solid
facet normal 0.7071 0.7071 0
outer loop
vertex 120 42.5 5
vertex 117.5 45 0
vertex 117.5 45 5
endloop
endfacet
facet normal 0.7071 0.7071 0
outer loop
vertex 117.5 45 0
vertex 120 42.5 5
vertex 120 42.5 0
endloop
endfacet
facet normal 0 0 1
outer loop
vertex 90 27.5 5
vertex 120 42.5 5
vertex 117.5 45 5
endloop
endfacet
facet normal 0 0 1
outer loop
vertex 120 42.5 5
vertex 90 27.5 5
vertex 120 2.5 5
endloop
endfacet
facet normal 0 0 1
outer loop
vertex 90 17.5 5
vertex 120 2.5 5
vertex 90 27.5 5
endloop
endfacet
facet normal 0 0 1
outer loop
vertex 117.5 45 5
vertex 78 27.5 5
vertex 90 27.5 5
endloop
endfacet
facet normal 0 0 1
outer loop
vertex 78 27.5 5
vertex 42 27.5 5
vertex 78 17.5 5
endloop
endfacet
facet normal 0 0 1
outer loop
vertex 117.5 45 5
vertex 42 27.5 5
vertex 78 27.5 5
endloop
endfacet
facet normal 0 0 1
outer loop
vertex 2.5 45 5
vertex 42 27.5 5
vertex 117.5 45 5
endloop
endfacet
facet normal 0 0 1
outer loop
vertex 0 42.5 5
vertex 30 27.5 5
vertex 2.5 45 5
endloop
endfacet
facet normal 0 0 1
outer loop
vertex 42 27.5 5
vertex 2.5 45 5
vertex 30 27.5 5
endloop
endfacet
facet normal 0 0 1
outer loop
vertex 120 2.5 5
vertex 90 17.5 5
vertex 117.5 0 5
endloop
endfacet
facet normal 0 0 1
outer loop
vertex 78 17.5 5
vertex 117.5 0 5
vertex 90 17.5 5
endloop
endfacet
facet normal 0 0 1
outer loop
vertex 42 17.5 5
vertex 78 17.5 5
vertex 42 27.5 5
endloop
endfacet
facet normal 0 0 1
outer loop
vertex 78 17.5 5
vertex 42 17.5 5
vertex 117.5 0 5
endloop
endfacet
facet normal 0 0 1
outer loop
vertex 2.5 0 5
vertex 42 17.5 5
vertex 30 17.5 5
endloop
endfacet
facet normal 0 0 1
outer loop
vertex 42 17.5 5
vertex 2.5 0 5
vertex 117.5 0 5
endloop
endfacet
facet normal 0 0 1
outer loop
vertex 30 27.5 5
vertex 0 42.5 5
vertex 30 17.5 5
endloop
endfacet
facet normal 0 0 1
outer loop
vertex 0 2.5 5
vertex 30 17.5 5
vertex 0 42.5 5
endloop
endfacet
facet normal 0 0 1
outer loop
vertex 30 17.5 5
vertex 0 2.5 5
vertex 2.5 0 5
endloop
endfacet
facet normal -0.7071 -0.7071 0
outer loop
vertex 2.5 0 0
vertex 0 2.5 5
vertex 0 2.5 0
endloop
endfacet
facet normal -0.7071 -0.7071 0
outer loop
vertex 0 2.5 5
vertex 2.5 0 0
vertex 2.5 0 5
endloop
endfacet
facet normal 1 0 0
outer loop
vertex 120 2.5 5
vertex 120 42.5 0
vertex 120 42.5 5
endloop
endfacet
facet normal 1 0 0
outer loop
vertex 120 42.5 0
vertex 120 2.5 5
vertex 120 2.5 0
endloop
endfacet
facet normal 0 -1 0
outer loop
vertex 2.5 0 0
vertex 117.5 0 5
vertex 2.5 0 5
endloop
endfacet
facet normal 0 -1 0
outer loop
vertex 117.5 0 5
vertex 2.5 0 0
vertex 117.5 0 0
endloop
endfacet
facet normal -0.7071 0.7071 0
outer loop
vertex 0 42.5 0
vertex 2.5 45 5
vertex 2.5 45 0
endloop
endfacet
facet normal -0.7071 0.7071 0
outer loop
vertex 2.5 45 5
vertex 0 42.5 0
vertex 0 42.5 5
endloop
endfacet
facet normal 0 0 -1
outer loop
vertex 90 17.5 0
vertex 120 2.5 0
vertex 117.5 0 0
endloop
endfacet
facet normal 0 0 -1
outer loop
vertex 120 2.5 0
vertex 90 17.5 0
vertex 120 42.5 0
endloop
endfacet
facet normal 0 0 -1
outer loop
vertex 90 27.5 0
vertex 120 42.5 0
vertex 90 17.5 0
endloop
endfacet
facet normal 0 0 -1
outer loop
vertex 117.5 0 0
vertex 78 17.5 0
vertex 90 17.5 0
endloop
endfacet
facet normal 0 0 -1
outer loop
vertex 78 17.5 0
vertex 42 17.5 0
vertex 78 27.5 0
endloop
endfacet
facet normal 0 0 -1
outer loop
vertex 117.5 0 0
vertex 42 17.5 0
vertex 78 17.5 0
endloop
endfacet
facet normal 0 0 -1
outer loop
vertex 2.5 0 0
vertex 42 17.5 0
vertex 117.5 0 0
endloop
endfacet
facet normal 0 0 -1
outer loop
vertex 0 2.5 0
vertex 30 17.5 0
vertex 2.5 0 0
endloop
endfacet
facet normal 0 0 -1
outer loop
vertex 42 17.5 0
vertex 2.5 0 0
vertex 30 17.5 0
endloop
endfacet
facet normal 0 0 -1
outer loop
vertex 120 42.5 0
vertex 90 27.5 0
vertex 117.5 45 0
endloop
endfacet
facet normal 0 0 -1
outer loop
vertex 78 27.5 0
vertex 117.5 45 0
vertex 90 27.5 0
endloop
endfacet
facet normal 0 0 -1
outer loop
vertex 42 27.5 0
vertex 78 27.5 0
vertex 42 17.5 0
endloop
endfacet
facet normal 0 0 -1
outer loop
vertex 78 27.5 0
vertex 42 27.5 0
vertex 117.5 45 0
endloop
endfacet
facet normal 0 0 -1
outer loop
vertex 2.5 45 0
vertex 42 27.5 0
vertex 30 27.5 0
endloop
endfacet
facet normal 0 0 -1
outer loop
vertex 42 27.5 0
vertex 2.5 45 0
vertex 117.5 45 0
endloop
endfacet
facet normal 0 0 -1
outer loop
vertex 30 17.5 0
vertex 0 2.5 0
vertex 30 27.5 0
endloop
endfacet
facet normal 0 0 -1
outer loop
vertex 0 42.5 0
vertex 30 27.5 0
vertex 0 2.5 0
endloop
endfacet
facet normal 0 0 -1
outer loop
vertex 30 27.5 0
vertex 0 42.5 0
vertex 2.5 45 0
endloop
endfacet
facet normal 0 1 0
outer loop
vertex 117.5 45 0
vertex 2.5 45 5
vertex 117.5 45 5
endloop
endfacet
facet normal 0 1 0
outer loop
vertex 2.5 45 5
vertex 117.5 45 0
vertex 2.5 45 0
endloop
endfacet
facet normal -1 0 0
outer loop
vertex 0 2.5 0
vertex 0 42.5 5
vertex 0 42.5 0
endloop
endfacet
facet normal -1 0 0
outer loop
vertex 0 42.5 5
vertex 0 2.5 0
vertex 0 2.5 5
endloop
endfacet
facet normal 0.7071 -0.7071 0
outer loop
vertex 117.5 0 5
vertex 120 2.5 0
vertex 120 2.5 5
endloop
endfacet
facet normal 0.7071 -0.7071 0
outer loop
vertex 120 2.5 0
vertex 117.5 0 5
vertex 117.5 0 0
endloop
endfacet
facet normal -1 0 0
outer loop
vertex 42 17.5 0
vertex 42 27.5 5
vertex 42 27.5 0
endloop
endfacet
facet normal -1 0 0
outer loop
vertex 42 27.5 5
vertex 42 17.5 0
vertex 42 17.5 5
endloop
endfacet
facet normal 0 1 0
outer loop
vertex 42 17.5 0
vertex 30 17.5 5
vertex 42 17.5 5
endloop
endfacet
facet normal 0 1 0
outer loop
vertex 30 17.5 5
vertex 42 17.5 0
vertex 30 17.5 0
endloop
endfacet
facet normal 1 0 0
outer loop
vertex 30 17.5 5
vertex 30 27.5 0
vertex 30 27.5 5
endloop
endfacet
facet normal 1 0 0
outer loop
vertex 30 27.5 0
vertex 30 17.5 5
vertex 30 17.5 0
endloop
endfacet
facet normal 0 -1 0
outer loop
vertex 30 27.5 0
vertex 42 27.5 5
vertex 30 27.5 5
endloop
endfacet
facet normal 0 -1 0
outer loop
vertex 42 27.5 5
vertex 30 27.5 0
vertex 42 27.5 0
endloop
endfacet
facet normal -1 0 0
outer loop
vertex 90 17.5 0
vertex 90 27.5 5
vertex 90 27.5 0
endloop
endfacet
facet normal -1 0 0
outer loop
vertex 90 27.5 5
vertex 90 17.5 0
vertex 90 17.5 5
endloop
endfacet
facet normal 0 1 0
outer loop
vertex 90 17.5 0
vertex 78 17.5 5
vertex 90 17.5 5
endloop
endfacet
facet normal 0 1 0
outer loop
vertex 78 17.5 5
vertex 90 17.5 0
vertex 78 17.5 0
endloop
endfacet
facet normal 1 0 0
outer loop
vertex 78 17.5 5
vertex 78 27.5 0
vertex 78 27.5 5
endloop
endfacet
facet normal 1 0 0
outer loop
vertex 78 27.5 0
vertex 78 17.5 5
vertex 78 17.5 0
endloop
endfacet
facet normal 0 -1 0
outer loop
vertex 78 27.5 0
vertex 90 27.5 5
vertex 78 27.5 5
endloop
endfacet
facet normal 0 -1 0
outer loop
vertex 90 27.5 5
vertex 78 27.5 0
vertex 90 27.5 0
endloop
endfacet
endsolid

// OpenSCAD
$fn = 32;

// ----------------------------------------------------------------------
// Windowed plate: 2 voids, 120 x 45 x 5 mm
// ----------------------------------------------------------------------

// --- parameters (mm) ---
plate_l = 120;            // plate length, X
plate_w = 45;             // plate width, Y
plate_t = 5;              // plate thickness, Z
edge_margin = 12;         // wall from the plate edge to any window
windows = 2;              // number of windows in the row
win_l = 12;               // window length
win_w = 10;               // window width
win_pitch = 48;           // window pitch along X
depth_1 = 5;              // depth of void 1 (full thickness = through)
depth_2 = 5;              // depth of void 2 (full thickness = through)
corner_c = 2.5;           // corner chamfer of the plate

profile = [[2.5, 0], [117.5, 0], [120, 2.5], [120, 42.5], [117.5, 45], [2.5, 45], [0, 42.5], [0, 2.5]];  // primary outline, 8 points, counter clockwise
void_1 = [[30, 17.5], [42, 17.5], [42, 27.5], [30, 27.5]];  // window 1 of the row, 4 points
void_2 = [[78, 17.5], [90, 17.5], [90, 27.5], [78, 27.5]];  // window 2 of the row, 4 points

// --- the one profile operation ---
difference() {
  linear_extrude(height = plate_t) polygon(points = profile);
  translate([0, 0, -1])
    linear_extrude(height = plate_t + 2) polygon(points = void_1);
  translate([0, 0, -1])
    linear_extrude(height = plate_t + 2) polygon(points = void_2);
}
